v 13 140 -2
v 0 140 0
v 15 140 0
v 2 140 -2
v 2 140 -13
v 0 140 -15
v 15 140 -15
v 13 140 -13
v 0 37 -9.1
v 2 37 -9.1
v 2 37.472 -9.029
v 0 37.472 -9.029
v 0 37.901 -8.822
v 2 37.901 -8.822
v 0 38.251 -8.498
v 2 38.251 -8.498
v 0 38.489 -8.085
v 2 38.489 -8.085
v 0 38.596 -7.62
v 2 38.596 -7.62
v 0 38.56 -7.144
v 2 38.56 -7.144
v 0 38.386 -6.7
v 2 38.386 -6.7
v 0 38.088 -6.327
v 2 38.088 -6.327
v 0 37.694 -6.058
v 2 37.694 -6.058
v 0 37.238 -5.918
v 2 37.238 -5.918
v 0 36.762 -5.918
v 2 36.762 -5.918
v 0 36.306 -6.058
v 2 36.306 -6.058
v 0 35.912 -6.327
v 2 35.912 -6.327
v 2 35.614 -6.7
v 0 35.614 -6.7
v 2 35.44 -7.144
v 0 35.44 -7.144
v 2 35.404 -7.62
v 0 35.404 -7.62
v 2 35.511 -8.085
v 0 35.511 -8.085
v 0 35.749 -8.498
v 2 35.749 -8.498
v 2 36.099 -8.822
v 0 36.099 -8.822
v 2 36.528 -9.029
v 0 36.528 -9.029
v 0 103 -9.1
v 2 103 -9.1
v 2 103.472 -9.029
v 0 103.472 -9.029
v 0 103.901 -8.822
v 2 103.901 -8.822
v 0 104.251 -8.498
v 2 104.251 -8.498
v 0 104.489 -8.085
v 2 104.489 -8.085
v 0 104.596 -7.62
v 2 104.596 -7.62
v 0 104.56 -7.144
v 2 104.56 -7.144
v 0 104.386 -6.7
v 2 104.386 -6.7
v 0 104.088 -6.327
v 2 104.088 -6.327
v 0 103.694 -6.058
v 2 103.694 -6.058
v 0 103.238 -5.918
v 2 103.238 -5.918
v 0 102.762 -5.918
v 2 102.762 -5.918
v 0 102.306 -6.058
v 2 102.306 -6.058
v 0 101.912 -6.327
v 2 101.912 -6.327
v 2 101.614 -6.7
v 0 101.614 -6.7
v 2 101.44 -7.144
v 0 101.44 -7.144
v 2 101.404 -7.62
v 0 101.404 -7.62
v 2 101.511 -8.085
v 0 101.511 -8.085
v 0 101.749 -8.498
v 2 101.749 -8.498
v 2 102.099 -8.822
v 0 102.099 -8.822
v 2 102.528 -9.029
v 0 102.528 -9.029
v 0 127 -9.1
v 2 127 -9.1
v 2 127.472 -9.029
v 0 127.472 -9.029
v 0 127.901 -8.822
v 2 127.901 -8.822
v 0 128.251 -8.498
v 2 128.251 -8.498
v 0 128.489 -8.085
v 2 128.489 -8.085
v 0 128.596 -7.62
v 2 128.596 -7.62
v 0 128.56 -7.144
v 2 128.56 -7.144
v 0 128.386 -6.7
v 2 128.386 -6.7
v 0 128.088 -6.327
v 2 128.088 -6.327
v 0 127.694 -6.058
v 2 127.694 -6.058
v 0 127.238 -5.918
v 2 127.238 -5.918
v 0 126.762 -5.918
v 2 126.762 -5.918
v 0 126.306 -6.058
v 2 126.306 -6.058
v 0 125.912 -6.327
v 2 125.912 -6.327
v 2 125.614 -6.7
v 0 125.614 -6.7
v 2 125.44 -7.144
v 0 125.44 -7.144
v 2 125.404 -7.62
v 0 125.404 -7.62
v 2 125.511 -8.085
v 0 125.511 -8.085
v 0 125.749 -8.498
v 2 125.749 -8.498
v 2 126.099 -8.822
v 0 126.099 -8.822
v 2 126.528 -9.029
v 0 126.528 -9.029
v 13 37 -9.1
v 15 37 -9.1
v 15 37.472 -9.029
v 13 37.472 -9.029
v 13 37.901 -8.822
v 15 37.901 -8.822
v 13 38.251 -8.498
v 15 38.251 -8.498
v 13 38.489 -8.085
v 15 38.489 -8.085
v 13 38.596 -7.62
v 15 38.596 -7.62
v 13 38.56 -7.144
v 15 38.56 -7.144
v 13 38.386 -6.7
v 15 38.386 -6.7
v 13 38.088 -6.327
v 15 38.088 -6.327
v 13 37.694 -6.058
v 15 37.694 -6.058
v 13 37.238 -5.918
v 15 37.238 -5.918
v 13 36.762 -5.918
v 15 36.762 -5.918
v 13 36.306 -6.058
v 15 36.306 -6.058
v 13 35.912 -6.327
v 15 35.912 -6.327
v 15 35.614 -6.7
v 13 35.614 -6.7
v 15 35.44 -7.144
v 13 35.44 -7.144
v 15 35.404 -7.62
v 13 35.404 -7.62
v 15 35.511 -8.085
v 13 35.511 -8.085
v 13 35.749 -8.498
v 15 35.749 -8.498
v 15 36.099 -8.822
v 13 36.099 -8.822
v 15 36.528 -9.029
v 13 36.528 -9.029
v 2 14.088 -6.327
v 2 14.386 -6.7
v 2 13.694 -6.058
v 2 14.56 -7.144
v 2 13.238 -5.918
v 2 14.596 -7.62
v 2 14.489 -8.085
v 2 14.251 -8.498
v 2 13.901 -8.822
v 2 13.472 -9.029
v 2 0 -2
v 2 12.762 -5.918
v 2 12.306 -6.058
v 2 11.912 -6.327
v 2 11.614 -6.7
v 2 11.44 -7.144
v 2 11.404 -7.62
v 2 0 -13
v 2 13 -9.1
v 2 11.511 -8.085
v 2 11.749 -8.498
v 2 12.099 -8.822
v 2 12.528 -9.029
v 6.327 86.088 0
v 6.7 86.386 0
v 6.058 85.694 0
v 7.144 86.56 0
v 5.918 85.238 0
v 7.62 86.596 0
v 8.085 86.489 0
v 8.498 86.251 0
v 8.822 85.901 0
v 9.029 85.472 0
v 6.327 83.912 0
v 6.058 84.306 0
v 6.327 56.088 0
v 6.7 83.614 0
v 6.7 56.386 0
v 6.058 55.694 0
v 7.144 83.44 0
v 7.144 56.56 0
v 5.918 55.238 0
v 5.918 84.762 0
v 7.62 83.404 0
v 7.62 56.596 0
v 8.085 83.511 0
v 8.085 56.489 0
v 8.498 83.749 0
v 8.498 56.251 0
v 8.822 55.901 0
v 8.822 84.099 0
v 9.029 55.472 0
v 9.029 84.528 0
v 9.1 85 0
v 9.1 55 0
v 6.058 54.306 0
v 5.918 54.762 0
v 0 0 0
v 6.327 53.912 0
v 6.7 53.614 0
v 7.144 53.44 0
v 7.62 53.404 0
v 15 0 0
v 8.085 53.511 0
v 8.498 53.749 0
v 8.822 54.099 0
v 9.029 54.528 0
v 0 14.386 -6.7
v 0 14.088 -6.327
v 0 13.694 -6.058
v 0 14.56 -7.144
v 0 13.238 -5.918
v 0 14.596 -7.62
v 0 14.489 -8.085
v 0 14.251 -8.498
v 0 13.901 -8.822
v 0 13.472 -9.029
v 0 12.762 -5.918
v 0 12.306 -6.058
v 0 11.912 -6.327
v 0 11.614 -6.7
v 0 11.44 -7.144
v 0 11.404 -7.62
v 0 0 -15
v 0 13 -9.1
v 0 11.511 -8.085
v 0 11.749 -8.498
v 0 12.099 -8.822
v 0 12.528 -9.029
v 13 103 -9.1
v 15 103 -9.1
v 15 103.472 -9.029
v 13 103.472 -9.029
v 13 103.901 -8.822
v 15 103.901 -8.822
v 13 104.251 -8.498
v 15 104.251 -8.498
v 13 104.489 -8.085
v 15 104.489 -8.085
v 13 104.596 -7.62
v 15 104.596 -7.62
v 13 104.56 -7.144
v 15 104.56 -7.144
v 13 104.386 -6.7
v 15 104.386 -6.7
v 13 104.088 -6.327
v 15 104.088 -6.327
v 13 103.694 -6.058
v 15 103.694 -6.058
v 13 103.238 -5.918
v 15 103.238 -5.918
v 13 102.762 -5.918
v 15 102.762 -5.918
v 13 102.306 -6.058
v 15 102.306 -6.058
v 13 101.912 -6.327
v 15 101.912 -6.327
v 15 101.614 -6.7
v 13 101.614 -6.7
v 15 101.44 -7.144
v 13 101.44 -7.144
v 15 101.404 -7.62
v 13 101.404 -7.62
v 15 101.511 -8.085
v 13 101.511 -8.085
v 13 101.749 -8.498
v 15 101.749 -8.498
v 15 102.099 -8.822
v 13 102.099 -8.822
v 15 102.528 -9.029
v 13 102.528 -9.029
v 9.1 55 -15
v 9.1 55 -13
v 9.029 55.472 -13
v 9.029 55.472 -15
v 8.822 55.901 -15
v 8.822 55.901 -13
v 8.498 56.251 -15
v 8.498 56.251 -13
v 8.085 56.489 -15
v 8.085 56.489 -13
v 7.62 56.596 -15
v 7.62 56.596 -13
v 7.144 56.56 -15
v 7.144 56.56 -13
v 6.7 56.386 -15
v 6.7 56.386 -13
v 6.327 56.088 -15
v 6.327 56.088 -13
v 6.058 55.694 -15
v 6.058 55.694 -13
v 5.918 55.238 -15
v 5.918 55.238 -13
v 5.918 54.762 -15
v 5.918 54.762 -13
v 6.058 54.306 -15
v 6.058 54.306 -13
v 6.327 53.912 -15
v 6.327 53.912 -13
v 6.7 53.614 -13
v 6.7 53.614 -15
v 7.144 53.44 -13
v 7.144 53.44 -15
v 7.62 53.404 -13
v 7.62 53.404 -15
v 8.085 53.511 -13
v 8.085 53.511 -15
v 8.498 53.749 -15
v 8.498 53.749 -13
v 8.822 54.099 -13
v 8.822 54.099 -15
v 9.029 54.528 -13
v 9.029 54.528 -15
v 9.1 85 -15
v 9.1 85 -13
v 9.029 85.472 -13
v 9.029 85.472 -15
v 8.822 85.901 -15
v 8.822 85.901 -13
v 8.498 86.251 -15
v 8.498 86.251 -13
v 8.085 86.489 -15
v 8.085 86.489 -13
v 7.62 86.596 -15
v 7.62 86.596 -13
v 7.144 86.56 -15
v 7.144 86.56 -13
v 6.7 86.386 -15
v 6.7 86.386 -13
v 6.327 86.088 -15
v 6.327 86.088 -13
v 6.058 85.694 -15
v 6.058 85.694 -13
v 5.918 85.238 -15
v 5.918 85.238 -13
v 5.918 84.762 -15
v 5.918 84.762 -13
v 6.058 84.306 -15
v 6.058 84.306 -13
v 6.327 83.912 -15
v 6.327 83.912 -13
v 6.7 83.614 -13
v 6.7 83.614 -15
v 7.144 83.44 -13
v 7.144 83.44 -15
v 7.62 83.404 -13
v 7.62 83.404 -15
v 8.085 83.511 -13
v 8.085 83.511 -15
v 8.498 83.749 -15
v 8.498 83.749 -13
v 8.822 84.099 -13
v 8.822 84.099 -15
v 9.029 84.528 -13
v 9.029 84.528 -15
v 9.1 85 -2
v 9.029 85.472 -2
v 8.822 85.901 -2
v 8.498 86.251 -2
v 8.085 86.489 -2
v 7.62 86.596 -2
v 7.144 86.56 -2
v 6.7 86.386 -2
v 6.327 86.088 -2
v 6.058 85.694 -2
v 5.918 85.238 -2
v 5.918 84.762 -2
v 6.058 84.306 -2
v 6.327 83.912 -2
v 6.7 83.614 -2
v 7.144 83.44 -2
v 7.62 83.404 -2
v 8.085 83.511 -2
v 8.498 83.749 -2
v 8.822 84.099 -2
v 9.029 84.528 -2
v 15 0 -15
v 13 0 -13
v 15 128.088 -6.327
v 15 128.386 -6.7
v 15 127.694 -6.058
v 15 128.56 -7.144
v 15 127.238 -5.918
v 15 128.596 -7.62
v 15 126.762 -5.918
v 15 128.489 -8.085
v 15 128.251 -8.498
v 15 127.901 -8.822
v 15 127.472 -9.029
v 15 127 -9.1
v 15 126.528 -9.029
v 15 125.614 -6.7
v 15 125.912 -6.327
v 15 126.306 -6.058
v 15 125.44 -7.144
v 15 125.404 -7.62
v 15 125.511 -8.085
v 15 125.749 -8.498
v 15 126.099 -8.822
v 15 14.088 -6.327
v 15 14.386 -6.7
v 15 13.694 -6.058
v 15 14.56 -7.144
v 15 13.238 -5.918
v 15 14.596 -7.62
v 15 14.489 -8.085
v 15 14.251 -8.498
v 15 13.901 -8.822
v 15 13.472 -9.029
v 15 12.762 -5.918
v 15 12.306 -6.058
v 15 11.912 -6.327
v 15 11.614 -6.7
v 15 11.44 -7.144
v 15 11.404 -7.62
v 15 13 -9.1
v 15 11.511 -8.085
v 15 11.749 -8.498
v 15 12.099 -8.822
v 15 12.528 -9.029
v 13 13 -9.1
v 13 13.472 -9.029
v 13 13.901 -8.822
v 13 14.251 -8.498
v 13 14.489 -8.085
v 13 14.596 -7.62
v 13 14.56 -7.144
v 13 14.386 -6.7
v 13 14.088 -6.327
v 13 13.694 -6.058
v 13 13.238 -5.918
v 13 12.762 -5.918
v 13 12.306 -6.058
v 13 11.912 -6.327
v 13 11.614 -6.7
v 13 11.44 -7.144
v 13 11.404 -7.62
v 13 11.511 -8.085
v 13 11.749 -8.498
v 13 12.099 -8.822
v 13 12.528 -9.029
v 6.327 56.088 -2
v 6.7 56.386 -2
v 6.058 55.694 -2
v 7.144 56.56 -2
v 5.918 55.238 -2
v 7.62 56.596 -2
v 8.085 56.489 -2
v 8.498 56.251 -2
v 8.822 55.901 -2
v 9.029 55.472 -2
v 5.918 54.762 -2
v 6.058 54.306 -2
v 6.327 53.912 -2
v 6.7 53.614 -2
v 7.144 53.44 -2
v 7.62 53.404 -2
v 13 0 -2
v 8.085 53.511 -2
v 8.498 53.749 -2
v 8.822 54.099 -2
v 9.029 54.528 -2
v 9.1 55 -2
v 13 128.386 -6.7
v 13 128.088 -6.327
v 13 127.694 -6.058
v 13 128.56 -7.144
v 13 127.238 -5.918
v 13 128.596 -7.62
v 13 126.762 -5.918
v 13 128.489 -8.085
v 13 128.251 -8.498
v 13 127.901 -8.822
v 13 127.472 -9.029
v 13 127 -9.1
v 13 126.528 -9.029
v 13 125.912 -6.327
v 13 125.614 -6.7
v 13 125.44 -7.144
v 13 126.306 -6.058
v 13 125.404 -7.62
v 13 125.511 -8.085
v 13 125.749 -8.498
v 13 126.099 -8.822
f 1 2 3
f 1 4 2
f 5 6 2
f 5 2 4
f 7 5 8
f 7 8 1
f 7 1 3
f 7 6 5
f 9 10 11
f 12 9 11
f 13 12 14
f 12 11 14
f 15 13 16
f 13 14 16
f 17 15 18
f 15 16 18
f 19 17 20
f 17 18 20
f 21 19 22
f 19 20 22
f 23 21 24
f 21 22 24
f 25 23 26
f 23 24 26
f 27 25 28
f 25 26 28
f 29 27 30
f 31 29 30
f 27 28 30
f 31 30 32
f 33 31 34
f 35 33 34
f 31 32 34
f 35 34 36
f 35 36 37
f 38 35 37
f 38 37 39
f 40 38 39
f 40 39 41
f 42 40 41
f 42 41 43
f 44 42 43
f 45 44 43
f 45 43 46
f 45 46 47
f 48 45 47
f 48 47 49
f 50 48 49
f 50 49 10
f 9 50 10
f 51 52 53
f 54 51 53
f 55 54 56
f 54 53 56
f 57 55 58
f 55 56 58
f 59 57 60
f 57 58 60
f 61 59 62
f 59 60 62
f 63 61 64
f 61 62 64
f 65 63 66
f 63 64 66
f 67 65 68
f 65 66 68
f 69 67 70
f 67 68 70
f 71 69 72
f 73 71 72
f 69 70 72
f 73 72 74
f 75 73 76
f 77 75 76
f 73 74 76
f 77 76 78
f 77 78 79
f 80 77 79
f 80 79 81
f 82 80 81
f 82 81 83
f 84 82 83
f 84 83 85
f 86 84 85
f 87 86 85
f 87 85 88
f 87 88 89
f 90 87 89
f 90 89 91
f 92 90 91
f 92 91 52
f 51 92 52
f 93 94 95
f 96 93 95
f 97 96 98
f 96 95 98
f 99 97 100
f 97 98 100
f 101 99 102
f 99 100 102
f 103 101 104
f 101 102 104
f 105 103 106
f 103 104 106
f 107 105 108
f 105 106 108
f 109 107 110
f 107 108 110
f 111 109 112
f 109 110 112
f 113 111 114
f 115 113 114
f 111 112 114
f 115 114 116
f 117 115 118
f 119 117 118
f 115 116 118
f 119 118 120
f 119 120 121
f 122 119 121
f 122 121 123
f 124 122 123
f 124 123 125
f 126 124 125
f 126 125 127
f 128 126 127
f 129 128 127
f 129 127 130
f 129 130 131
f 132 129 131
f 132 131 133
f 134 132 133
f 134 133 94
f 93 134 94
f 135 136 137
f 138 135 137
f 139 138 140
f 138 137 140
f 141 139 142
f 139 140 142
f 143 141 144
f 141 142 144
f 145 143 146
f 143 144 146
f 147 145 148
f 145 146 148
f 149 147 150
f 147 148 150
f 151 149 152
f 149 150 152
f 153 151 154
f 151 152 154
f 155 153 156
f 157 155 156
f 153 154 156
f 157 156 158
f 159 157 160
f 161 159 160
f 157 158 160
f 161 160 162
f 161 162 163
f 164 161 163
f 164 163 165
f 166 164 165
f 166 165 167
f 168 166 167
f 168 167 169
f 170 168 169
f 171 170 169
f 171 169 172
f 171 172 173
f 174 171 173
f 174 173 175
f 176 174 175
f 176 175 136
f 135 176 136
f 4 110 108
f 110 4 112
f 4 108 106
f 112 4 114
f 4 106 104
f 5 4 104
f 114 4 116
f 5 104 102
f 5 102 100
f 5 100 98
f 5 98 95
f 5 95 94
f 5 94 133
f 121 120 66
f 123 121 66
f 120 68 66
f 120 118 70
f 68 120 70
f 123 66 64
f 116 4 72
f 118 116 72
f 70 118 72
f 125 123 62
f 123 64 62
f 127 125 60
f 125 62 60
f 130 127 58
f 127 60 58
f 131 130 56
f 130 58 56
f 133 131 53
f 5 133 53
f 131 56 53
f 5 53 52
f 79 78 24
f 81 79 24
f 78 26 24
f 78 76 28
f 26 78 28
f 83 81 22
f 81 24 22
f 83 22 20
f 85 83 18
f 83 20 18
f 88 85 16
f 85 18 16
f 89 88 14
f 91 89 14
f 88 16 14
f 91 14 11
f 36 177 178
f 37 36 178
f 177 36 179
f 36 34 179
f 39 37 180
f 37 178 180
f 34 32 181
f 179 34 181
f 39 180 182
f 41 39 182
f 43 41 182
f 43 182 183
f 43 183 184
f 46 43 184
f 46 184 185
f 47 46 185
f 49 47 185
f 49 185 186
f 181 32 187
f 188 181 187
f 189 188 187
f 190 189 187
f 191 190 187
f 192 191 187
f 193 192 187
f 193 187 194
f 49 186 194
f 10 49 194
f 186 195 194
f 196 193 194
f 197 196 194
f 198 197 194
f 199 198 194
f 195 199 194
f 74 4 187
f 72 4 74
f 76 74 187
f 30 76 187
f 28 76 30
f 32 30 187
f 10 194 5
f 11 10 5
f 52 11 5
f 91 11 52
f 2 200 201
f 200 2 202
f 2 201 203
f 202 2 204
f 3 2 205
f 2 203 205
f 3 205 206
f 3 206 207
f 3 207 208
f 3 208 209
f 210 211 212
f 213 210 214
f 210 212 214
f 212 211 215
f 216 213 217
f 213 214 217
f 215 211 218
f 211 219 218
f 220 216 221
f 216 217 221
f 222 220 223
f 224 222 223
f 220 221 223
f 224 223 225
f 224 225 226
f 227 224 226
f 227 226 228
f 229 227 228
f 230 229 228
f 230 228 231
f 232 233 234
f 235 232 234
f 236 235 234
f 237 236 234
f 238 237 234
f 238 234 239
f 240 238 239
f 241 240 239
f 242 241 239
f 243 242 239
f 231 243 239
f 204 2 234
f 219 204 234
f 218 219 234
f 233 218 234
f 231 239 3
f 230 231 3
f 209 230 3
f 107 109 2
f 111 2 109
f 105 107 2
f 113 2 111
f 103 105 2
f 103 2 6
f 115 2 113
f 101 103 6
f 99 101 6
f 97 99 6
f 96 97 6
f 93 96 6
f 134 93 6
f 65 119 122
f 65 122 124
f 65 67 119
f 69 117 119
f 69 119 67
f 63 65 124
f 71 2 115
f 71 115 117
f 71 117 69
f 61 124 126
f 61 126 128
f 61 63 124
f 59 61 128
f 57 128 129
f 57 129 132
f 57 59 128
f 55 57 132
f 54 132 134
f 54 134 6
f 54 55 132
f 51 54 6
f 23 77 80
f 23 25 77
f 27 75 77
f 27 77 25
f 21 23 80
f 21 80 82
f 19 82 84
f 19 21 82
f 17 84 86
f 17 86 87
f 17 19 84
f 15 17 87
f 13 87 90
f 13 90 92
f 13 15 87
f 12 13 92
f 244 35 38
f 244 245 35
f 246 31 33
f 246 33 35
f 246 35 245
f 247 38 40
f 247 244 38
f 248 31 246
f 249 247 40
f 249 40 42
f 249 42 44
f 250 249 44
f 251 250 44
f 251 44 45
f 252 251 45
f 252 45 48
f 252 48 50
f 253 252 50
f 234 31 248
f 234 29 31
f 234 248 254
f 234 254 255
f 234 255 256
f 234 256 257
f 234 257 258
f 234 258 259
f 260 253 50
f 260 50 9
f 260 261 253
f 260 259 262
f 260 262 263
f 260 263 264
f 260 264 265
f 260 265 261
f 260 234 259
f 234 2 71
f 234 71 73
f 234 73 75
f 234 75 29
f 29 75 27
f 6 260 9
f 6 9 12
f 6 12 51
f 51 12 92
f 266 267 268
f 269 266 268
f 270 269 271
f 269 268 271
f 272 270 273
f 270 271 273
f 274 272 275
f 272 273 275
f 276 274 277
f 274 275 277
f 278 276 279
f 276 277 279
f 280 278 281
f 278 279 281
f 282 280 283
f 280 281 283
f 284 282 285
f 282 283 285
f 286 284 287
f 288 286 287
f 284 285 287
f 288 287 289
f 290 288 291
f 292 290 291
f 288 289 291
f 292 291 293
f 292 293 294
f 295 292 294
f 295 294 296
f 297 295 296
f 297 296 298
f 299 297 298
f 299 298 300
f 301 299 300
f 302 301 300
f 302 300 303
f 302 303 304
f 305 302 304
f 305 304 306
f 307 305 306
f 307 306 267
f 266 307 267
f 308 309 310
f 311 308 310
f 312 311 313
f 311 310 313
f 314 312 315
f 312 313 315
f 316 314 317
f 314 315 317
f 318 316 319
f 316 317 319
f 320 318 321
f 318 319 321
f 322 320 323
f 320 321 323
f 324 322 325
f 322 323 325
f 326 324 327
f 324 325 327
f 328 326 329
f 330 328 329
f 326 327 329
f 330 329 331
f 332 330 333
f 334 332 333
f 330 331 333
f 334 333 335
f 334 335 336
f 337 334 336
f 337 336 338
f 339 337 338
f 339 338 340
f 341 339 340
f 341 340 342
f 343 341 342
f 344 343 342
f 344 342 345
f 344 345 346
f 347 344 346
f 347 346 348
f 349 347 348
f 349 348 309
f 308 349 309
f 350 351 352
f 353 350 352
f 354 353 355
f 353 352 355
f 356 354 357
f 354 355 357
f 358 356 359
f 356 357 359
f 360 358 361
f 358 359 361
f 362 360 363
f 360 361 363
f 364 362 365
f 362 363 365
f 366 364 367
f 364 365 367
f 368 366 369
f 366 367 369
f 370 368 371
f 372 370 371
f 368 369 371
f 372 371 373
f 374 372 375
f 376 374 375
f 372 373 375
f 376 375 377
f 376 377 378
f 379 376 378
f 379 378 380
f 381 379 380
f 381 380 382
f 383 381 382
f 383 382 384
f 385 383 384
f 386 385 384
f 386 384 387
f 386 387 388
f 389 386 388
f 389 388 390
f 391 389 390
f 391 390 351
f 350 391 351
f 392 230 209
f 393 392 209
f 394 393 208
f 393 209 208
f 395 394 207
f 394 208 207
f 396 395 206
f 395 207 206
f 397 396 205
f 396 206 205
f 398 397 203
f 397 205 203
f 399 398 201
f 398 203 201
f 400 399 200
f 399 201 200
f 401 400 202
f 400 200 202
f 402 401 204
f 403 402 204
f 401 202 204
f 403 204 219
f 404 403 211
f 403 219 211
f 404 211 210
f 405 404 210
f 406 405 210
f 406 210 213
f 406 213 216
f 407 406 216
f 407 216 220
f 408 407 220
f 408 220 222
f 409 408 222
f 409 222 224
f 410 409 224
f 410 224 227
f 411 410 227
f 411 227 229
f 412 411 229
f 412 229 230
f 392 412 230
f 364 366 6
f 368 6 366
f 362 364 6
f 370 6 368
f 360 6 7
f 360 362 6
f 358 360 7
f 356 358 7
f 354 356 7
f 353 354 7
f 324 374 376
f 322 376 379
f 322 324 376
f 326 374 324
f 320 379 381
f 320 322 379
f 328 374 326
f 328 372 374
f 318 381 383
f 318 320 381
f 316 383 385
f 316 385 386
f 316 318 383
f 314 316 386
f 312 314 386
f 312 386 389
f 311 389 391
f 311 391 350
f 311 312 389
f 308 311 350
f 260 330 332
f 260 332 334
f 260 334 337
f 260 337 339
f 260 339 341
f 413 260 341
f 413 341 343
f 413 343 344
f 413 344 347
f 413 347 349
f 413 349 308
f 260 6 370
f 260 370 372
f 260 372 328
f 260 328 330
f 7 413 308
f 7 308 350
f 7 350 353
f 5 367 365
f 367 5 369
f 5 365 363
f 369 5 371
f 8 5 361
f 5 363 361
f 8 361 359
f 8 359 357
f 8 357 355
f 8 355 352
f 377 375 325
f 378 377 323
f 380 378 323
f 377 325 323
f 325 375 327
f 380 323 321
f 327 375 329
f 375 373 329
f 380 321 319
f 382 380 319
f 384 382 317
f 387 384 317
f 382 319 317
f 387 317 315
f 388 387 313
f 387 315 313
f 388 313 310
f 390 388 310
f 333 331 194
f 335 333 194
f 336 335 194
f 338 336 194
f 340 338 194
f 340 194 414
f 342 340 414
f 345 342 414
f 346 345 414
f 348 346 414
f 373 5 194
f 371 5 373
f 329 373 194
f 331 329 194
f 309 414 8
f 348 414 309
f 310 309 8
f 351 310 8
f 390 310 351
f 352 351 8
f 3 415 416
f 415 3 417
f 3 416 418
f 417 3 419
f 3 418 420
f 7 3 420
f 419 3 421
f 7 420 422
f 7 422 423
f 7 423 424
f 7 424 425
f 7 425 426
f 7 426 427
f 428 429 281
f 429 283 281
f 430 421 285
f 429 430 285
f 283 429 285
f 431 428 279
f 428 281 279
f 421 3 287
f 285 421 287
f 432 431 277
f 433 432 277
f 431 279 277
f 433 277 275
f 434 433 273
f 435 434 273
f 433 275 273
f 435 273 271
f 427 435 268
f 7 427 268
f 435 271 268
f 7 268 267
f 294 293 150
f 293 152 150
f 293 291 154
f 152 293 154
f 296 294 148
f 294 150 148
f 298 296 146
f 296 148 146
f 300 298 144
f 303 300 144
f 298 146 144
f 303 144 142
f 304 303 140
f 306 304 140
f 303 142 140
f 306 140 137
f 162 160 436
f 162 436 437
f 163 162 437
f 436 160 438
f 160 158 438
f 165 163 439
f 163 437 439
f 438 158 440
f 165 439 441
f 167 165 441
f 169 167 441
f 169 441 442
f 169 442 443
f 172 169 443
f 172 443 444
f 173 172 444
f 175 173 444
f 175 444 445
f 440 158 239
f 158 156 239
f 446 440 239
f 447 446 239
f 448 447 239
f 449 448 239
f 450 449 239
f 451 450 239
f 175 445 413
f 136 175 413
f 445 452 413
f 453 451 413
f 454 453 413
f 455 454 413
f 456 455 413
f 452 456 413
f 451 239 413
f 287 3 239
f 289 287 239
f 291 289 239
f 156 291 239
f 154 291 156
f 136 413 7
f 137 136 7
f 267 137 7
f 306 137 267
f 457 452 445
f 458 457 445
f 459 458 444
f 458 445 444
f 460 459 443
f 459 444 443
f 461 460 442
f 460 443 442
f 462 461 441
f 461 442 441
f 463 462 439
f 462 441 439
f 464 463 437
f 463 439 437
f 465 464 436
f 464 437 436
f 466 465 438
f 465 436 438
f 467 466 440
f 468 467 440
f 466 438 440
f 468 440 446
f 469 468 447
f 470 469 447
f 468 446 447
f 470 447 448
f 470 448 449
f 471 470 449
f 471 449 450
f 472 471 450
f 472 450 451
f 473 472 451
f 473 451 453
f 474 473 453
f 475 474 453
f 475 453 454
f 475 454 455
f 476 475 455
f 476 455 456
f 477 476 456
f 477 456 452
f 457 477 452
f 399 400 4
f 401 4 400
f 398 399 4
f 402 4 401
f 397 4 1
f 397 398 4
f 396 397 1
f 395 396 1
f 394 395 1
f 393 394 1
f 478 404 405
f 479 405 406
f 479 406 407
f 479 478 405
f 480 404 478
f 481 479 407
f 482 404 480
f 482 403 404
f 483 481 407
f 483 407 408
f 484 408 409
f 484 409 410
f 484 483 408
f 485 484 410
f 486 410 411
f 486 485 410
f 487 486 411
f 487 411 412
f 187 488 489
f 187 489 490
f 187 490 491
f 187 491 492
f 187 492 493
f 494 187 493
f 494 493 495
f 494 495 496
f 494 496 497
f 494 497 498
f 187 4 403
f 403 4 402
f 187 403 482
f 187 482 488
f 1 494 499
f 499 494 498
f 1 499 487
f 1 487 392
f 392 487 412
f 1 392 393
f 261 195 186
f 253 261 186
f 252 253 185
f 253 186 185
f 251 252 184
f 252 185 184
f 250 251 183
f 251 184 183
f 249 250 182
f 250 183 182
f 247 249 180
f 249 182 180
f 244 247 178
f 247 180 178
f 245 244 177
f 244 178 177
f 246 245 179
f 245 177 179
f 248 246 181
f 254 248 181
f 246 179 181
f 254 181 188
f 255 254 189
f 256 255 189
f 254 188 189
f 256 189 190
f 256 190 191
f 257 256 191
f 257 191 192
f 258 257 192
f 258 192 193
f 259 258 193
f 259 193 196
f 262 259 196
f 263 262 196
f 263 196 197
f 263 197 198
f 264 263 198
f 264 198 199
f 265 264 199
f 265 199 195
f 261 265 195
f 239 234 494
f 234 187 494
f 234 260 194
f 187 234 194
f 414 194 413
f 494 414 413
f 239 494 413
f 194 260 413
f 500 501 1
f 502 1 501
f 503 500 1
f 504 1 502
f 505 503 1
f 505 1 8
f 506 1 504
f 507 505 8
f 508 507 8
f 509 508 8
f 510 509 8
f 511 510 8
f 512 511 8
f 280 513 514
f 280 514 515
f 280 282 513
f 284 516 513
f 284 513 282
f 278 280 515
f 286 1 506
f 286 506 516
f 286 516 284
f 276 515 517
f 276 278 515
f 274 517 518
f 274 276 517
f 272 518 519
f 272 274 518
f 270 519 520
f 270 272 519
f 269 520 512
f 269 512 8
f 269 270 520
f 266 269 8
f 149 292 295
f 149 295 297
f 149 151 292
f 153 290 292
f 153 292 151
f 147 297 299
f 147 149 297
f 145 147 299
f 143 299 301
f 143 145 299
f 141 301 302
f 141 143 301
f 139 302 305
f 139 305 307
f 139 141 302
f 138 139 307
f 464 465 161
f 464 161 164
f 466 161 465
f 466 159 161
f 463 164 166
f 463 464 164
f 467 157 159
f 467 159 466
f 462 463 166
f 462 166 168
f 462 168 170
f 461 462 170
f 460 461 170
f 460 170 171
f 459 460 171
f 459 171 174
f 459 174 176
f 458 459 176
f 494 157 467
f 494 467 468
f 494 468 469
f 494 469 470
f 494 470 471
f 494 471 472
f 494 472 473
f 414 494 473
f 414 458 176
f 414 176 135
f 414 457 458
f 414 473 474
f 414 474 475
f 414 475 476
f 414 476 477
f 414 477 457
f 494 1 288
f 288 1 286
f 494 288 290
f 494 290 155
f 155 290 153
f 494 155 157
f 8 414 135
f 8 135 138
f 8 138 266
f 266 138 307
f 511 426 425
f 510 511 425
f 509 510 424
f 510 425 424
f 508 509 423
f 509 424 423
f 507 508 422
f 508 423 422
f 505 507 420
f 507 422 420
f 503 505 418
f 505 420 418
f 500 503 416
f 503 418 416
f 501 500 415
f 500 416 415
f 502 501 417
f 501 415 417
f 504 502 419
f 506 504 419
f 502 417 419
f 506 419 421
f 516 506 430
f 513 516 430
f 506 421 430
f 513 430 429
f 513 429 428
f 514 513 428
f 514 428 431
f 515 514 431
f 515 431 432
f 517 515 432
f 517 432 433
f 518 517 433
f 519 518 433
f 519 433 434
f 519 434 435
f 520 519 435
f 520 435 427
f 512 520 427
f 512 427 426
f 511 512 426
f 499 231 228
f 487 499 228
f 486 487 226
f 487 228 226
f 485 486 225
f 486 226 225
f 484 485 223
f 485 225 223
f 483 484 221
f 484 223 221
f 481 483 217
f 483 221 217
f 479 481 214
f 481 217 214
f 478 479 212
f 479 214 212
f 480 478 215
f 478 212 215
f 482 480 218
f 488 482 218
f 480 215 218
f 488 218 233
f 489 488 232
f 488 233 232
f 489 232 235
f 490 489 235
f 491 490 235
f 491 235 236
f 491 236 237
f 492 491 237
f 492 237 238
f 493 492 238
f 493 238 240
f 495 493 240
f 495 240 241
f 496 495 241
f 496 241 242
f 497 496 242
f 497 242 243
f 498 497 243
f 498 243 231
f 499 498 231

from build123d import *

# Parameters (mm, degrees)
SKETCH1_W           = 15
SKETCH1_H           = 15
SKETCH1_W_2         = 11
SKETCH1_H_2         = 11
BOSS_EXTRUDE1_DEPTH = 140
SKETCH2_R           = 1.6
CUT_EXTRUDE1_DEPTH  = 142.598022585
SKETCH3_R           = 1.6
CUT_EXTRUDE2_DEPTH  = 142.598022585


with BuildPart() as part:
    # Sketch1 → Boss-Extrude1 (new body)
    with BuildSketch(Plane(origin=(0, 0, 0), x_dir=(1, 0, 0), z_dir=(0, 1, 0))):
        with Locations((7.5, 7.5)):
            Rectangle(SKETCH1_W, SKETCH1_H)
        with Locations((7.5, 7.5)):
            Rectangle(SKETCH1_W_2, SKETCH1_H_2, mode=Mode.SUBTRACT)
    extrude(amount=BOSS_EXTRUDE1_DEPTH)

    # Sketch2 → Cut-Extrude1 (cut, through all)
    with BuildSketch(Plane(origin=(15, 0, 0), x_dir=(0, 0, -1), z_dir=(1, 0, 0))):
        with Locations((7.5, 13)):
            Circle(SKETCH2_R)
        with Locations((7.5, 37)):
            Circle(SKETCH2_R)
        with Locations((7.5, 103)):
            Circle(SKETCH2_R)
        with Locations((7.5, 127)):
            Circle(SKETCH2_R)
    extrude(amount=-CUT_EXTRUDE1_DEPTH, mode=Mode.SUBTRACT)

    # Sketch3 → Cut-Extrude2 (cut, through all)
    with BuildSketch(Plane.XY):
        with Locations((7.5, 85)):
            Circle(SKETCH3_R)
        with Locations((7.5, 55)):
            Circle(SKETCH3_R)
    extrude(amount=-CUT_EXTRUDE2_DEPTH, mode=Mode.SUBTRACT)


solid = part.part
